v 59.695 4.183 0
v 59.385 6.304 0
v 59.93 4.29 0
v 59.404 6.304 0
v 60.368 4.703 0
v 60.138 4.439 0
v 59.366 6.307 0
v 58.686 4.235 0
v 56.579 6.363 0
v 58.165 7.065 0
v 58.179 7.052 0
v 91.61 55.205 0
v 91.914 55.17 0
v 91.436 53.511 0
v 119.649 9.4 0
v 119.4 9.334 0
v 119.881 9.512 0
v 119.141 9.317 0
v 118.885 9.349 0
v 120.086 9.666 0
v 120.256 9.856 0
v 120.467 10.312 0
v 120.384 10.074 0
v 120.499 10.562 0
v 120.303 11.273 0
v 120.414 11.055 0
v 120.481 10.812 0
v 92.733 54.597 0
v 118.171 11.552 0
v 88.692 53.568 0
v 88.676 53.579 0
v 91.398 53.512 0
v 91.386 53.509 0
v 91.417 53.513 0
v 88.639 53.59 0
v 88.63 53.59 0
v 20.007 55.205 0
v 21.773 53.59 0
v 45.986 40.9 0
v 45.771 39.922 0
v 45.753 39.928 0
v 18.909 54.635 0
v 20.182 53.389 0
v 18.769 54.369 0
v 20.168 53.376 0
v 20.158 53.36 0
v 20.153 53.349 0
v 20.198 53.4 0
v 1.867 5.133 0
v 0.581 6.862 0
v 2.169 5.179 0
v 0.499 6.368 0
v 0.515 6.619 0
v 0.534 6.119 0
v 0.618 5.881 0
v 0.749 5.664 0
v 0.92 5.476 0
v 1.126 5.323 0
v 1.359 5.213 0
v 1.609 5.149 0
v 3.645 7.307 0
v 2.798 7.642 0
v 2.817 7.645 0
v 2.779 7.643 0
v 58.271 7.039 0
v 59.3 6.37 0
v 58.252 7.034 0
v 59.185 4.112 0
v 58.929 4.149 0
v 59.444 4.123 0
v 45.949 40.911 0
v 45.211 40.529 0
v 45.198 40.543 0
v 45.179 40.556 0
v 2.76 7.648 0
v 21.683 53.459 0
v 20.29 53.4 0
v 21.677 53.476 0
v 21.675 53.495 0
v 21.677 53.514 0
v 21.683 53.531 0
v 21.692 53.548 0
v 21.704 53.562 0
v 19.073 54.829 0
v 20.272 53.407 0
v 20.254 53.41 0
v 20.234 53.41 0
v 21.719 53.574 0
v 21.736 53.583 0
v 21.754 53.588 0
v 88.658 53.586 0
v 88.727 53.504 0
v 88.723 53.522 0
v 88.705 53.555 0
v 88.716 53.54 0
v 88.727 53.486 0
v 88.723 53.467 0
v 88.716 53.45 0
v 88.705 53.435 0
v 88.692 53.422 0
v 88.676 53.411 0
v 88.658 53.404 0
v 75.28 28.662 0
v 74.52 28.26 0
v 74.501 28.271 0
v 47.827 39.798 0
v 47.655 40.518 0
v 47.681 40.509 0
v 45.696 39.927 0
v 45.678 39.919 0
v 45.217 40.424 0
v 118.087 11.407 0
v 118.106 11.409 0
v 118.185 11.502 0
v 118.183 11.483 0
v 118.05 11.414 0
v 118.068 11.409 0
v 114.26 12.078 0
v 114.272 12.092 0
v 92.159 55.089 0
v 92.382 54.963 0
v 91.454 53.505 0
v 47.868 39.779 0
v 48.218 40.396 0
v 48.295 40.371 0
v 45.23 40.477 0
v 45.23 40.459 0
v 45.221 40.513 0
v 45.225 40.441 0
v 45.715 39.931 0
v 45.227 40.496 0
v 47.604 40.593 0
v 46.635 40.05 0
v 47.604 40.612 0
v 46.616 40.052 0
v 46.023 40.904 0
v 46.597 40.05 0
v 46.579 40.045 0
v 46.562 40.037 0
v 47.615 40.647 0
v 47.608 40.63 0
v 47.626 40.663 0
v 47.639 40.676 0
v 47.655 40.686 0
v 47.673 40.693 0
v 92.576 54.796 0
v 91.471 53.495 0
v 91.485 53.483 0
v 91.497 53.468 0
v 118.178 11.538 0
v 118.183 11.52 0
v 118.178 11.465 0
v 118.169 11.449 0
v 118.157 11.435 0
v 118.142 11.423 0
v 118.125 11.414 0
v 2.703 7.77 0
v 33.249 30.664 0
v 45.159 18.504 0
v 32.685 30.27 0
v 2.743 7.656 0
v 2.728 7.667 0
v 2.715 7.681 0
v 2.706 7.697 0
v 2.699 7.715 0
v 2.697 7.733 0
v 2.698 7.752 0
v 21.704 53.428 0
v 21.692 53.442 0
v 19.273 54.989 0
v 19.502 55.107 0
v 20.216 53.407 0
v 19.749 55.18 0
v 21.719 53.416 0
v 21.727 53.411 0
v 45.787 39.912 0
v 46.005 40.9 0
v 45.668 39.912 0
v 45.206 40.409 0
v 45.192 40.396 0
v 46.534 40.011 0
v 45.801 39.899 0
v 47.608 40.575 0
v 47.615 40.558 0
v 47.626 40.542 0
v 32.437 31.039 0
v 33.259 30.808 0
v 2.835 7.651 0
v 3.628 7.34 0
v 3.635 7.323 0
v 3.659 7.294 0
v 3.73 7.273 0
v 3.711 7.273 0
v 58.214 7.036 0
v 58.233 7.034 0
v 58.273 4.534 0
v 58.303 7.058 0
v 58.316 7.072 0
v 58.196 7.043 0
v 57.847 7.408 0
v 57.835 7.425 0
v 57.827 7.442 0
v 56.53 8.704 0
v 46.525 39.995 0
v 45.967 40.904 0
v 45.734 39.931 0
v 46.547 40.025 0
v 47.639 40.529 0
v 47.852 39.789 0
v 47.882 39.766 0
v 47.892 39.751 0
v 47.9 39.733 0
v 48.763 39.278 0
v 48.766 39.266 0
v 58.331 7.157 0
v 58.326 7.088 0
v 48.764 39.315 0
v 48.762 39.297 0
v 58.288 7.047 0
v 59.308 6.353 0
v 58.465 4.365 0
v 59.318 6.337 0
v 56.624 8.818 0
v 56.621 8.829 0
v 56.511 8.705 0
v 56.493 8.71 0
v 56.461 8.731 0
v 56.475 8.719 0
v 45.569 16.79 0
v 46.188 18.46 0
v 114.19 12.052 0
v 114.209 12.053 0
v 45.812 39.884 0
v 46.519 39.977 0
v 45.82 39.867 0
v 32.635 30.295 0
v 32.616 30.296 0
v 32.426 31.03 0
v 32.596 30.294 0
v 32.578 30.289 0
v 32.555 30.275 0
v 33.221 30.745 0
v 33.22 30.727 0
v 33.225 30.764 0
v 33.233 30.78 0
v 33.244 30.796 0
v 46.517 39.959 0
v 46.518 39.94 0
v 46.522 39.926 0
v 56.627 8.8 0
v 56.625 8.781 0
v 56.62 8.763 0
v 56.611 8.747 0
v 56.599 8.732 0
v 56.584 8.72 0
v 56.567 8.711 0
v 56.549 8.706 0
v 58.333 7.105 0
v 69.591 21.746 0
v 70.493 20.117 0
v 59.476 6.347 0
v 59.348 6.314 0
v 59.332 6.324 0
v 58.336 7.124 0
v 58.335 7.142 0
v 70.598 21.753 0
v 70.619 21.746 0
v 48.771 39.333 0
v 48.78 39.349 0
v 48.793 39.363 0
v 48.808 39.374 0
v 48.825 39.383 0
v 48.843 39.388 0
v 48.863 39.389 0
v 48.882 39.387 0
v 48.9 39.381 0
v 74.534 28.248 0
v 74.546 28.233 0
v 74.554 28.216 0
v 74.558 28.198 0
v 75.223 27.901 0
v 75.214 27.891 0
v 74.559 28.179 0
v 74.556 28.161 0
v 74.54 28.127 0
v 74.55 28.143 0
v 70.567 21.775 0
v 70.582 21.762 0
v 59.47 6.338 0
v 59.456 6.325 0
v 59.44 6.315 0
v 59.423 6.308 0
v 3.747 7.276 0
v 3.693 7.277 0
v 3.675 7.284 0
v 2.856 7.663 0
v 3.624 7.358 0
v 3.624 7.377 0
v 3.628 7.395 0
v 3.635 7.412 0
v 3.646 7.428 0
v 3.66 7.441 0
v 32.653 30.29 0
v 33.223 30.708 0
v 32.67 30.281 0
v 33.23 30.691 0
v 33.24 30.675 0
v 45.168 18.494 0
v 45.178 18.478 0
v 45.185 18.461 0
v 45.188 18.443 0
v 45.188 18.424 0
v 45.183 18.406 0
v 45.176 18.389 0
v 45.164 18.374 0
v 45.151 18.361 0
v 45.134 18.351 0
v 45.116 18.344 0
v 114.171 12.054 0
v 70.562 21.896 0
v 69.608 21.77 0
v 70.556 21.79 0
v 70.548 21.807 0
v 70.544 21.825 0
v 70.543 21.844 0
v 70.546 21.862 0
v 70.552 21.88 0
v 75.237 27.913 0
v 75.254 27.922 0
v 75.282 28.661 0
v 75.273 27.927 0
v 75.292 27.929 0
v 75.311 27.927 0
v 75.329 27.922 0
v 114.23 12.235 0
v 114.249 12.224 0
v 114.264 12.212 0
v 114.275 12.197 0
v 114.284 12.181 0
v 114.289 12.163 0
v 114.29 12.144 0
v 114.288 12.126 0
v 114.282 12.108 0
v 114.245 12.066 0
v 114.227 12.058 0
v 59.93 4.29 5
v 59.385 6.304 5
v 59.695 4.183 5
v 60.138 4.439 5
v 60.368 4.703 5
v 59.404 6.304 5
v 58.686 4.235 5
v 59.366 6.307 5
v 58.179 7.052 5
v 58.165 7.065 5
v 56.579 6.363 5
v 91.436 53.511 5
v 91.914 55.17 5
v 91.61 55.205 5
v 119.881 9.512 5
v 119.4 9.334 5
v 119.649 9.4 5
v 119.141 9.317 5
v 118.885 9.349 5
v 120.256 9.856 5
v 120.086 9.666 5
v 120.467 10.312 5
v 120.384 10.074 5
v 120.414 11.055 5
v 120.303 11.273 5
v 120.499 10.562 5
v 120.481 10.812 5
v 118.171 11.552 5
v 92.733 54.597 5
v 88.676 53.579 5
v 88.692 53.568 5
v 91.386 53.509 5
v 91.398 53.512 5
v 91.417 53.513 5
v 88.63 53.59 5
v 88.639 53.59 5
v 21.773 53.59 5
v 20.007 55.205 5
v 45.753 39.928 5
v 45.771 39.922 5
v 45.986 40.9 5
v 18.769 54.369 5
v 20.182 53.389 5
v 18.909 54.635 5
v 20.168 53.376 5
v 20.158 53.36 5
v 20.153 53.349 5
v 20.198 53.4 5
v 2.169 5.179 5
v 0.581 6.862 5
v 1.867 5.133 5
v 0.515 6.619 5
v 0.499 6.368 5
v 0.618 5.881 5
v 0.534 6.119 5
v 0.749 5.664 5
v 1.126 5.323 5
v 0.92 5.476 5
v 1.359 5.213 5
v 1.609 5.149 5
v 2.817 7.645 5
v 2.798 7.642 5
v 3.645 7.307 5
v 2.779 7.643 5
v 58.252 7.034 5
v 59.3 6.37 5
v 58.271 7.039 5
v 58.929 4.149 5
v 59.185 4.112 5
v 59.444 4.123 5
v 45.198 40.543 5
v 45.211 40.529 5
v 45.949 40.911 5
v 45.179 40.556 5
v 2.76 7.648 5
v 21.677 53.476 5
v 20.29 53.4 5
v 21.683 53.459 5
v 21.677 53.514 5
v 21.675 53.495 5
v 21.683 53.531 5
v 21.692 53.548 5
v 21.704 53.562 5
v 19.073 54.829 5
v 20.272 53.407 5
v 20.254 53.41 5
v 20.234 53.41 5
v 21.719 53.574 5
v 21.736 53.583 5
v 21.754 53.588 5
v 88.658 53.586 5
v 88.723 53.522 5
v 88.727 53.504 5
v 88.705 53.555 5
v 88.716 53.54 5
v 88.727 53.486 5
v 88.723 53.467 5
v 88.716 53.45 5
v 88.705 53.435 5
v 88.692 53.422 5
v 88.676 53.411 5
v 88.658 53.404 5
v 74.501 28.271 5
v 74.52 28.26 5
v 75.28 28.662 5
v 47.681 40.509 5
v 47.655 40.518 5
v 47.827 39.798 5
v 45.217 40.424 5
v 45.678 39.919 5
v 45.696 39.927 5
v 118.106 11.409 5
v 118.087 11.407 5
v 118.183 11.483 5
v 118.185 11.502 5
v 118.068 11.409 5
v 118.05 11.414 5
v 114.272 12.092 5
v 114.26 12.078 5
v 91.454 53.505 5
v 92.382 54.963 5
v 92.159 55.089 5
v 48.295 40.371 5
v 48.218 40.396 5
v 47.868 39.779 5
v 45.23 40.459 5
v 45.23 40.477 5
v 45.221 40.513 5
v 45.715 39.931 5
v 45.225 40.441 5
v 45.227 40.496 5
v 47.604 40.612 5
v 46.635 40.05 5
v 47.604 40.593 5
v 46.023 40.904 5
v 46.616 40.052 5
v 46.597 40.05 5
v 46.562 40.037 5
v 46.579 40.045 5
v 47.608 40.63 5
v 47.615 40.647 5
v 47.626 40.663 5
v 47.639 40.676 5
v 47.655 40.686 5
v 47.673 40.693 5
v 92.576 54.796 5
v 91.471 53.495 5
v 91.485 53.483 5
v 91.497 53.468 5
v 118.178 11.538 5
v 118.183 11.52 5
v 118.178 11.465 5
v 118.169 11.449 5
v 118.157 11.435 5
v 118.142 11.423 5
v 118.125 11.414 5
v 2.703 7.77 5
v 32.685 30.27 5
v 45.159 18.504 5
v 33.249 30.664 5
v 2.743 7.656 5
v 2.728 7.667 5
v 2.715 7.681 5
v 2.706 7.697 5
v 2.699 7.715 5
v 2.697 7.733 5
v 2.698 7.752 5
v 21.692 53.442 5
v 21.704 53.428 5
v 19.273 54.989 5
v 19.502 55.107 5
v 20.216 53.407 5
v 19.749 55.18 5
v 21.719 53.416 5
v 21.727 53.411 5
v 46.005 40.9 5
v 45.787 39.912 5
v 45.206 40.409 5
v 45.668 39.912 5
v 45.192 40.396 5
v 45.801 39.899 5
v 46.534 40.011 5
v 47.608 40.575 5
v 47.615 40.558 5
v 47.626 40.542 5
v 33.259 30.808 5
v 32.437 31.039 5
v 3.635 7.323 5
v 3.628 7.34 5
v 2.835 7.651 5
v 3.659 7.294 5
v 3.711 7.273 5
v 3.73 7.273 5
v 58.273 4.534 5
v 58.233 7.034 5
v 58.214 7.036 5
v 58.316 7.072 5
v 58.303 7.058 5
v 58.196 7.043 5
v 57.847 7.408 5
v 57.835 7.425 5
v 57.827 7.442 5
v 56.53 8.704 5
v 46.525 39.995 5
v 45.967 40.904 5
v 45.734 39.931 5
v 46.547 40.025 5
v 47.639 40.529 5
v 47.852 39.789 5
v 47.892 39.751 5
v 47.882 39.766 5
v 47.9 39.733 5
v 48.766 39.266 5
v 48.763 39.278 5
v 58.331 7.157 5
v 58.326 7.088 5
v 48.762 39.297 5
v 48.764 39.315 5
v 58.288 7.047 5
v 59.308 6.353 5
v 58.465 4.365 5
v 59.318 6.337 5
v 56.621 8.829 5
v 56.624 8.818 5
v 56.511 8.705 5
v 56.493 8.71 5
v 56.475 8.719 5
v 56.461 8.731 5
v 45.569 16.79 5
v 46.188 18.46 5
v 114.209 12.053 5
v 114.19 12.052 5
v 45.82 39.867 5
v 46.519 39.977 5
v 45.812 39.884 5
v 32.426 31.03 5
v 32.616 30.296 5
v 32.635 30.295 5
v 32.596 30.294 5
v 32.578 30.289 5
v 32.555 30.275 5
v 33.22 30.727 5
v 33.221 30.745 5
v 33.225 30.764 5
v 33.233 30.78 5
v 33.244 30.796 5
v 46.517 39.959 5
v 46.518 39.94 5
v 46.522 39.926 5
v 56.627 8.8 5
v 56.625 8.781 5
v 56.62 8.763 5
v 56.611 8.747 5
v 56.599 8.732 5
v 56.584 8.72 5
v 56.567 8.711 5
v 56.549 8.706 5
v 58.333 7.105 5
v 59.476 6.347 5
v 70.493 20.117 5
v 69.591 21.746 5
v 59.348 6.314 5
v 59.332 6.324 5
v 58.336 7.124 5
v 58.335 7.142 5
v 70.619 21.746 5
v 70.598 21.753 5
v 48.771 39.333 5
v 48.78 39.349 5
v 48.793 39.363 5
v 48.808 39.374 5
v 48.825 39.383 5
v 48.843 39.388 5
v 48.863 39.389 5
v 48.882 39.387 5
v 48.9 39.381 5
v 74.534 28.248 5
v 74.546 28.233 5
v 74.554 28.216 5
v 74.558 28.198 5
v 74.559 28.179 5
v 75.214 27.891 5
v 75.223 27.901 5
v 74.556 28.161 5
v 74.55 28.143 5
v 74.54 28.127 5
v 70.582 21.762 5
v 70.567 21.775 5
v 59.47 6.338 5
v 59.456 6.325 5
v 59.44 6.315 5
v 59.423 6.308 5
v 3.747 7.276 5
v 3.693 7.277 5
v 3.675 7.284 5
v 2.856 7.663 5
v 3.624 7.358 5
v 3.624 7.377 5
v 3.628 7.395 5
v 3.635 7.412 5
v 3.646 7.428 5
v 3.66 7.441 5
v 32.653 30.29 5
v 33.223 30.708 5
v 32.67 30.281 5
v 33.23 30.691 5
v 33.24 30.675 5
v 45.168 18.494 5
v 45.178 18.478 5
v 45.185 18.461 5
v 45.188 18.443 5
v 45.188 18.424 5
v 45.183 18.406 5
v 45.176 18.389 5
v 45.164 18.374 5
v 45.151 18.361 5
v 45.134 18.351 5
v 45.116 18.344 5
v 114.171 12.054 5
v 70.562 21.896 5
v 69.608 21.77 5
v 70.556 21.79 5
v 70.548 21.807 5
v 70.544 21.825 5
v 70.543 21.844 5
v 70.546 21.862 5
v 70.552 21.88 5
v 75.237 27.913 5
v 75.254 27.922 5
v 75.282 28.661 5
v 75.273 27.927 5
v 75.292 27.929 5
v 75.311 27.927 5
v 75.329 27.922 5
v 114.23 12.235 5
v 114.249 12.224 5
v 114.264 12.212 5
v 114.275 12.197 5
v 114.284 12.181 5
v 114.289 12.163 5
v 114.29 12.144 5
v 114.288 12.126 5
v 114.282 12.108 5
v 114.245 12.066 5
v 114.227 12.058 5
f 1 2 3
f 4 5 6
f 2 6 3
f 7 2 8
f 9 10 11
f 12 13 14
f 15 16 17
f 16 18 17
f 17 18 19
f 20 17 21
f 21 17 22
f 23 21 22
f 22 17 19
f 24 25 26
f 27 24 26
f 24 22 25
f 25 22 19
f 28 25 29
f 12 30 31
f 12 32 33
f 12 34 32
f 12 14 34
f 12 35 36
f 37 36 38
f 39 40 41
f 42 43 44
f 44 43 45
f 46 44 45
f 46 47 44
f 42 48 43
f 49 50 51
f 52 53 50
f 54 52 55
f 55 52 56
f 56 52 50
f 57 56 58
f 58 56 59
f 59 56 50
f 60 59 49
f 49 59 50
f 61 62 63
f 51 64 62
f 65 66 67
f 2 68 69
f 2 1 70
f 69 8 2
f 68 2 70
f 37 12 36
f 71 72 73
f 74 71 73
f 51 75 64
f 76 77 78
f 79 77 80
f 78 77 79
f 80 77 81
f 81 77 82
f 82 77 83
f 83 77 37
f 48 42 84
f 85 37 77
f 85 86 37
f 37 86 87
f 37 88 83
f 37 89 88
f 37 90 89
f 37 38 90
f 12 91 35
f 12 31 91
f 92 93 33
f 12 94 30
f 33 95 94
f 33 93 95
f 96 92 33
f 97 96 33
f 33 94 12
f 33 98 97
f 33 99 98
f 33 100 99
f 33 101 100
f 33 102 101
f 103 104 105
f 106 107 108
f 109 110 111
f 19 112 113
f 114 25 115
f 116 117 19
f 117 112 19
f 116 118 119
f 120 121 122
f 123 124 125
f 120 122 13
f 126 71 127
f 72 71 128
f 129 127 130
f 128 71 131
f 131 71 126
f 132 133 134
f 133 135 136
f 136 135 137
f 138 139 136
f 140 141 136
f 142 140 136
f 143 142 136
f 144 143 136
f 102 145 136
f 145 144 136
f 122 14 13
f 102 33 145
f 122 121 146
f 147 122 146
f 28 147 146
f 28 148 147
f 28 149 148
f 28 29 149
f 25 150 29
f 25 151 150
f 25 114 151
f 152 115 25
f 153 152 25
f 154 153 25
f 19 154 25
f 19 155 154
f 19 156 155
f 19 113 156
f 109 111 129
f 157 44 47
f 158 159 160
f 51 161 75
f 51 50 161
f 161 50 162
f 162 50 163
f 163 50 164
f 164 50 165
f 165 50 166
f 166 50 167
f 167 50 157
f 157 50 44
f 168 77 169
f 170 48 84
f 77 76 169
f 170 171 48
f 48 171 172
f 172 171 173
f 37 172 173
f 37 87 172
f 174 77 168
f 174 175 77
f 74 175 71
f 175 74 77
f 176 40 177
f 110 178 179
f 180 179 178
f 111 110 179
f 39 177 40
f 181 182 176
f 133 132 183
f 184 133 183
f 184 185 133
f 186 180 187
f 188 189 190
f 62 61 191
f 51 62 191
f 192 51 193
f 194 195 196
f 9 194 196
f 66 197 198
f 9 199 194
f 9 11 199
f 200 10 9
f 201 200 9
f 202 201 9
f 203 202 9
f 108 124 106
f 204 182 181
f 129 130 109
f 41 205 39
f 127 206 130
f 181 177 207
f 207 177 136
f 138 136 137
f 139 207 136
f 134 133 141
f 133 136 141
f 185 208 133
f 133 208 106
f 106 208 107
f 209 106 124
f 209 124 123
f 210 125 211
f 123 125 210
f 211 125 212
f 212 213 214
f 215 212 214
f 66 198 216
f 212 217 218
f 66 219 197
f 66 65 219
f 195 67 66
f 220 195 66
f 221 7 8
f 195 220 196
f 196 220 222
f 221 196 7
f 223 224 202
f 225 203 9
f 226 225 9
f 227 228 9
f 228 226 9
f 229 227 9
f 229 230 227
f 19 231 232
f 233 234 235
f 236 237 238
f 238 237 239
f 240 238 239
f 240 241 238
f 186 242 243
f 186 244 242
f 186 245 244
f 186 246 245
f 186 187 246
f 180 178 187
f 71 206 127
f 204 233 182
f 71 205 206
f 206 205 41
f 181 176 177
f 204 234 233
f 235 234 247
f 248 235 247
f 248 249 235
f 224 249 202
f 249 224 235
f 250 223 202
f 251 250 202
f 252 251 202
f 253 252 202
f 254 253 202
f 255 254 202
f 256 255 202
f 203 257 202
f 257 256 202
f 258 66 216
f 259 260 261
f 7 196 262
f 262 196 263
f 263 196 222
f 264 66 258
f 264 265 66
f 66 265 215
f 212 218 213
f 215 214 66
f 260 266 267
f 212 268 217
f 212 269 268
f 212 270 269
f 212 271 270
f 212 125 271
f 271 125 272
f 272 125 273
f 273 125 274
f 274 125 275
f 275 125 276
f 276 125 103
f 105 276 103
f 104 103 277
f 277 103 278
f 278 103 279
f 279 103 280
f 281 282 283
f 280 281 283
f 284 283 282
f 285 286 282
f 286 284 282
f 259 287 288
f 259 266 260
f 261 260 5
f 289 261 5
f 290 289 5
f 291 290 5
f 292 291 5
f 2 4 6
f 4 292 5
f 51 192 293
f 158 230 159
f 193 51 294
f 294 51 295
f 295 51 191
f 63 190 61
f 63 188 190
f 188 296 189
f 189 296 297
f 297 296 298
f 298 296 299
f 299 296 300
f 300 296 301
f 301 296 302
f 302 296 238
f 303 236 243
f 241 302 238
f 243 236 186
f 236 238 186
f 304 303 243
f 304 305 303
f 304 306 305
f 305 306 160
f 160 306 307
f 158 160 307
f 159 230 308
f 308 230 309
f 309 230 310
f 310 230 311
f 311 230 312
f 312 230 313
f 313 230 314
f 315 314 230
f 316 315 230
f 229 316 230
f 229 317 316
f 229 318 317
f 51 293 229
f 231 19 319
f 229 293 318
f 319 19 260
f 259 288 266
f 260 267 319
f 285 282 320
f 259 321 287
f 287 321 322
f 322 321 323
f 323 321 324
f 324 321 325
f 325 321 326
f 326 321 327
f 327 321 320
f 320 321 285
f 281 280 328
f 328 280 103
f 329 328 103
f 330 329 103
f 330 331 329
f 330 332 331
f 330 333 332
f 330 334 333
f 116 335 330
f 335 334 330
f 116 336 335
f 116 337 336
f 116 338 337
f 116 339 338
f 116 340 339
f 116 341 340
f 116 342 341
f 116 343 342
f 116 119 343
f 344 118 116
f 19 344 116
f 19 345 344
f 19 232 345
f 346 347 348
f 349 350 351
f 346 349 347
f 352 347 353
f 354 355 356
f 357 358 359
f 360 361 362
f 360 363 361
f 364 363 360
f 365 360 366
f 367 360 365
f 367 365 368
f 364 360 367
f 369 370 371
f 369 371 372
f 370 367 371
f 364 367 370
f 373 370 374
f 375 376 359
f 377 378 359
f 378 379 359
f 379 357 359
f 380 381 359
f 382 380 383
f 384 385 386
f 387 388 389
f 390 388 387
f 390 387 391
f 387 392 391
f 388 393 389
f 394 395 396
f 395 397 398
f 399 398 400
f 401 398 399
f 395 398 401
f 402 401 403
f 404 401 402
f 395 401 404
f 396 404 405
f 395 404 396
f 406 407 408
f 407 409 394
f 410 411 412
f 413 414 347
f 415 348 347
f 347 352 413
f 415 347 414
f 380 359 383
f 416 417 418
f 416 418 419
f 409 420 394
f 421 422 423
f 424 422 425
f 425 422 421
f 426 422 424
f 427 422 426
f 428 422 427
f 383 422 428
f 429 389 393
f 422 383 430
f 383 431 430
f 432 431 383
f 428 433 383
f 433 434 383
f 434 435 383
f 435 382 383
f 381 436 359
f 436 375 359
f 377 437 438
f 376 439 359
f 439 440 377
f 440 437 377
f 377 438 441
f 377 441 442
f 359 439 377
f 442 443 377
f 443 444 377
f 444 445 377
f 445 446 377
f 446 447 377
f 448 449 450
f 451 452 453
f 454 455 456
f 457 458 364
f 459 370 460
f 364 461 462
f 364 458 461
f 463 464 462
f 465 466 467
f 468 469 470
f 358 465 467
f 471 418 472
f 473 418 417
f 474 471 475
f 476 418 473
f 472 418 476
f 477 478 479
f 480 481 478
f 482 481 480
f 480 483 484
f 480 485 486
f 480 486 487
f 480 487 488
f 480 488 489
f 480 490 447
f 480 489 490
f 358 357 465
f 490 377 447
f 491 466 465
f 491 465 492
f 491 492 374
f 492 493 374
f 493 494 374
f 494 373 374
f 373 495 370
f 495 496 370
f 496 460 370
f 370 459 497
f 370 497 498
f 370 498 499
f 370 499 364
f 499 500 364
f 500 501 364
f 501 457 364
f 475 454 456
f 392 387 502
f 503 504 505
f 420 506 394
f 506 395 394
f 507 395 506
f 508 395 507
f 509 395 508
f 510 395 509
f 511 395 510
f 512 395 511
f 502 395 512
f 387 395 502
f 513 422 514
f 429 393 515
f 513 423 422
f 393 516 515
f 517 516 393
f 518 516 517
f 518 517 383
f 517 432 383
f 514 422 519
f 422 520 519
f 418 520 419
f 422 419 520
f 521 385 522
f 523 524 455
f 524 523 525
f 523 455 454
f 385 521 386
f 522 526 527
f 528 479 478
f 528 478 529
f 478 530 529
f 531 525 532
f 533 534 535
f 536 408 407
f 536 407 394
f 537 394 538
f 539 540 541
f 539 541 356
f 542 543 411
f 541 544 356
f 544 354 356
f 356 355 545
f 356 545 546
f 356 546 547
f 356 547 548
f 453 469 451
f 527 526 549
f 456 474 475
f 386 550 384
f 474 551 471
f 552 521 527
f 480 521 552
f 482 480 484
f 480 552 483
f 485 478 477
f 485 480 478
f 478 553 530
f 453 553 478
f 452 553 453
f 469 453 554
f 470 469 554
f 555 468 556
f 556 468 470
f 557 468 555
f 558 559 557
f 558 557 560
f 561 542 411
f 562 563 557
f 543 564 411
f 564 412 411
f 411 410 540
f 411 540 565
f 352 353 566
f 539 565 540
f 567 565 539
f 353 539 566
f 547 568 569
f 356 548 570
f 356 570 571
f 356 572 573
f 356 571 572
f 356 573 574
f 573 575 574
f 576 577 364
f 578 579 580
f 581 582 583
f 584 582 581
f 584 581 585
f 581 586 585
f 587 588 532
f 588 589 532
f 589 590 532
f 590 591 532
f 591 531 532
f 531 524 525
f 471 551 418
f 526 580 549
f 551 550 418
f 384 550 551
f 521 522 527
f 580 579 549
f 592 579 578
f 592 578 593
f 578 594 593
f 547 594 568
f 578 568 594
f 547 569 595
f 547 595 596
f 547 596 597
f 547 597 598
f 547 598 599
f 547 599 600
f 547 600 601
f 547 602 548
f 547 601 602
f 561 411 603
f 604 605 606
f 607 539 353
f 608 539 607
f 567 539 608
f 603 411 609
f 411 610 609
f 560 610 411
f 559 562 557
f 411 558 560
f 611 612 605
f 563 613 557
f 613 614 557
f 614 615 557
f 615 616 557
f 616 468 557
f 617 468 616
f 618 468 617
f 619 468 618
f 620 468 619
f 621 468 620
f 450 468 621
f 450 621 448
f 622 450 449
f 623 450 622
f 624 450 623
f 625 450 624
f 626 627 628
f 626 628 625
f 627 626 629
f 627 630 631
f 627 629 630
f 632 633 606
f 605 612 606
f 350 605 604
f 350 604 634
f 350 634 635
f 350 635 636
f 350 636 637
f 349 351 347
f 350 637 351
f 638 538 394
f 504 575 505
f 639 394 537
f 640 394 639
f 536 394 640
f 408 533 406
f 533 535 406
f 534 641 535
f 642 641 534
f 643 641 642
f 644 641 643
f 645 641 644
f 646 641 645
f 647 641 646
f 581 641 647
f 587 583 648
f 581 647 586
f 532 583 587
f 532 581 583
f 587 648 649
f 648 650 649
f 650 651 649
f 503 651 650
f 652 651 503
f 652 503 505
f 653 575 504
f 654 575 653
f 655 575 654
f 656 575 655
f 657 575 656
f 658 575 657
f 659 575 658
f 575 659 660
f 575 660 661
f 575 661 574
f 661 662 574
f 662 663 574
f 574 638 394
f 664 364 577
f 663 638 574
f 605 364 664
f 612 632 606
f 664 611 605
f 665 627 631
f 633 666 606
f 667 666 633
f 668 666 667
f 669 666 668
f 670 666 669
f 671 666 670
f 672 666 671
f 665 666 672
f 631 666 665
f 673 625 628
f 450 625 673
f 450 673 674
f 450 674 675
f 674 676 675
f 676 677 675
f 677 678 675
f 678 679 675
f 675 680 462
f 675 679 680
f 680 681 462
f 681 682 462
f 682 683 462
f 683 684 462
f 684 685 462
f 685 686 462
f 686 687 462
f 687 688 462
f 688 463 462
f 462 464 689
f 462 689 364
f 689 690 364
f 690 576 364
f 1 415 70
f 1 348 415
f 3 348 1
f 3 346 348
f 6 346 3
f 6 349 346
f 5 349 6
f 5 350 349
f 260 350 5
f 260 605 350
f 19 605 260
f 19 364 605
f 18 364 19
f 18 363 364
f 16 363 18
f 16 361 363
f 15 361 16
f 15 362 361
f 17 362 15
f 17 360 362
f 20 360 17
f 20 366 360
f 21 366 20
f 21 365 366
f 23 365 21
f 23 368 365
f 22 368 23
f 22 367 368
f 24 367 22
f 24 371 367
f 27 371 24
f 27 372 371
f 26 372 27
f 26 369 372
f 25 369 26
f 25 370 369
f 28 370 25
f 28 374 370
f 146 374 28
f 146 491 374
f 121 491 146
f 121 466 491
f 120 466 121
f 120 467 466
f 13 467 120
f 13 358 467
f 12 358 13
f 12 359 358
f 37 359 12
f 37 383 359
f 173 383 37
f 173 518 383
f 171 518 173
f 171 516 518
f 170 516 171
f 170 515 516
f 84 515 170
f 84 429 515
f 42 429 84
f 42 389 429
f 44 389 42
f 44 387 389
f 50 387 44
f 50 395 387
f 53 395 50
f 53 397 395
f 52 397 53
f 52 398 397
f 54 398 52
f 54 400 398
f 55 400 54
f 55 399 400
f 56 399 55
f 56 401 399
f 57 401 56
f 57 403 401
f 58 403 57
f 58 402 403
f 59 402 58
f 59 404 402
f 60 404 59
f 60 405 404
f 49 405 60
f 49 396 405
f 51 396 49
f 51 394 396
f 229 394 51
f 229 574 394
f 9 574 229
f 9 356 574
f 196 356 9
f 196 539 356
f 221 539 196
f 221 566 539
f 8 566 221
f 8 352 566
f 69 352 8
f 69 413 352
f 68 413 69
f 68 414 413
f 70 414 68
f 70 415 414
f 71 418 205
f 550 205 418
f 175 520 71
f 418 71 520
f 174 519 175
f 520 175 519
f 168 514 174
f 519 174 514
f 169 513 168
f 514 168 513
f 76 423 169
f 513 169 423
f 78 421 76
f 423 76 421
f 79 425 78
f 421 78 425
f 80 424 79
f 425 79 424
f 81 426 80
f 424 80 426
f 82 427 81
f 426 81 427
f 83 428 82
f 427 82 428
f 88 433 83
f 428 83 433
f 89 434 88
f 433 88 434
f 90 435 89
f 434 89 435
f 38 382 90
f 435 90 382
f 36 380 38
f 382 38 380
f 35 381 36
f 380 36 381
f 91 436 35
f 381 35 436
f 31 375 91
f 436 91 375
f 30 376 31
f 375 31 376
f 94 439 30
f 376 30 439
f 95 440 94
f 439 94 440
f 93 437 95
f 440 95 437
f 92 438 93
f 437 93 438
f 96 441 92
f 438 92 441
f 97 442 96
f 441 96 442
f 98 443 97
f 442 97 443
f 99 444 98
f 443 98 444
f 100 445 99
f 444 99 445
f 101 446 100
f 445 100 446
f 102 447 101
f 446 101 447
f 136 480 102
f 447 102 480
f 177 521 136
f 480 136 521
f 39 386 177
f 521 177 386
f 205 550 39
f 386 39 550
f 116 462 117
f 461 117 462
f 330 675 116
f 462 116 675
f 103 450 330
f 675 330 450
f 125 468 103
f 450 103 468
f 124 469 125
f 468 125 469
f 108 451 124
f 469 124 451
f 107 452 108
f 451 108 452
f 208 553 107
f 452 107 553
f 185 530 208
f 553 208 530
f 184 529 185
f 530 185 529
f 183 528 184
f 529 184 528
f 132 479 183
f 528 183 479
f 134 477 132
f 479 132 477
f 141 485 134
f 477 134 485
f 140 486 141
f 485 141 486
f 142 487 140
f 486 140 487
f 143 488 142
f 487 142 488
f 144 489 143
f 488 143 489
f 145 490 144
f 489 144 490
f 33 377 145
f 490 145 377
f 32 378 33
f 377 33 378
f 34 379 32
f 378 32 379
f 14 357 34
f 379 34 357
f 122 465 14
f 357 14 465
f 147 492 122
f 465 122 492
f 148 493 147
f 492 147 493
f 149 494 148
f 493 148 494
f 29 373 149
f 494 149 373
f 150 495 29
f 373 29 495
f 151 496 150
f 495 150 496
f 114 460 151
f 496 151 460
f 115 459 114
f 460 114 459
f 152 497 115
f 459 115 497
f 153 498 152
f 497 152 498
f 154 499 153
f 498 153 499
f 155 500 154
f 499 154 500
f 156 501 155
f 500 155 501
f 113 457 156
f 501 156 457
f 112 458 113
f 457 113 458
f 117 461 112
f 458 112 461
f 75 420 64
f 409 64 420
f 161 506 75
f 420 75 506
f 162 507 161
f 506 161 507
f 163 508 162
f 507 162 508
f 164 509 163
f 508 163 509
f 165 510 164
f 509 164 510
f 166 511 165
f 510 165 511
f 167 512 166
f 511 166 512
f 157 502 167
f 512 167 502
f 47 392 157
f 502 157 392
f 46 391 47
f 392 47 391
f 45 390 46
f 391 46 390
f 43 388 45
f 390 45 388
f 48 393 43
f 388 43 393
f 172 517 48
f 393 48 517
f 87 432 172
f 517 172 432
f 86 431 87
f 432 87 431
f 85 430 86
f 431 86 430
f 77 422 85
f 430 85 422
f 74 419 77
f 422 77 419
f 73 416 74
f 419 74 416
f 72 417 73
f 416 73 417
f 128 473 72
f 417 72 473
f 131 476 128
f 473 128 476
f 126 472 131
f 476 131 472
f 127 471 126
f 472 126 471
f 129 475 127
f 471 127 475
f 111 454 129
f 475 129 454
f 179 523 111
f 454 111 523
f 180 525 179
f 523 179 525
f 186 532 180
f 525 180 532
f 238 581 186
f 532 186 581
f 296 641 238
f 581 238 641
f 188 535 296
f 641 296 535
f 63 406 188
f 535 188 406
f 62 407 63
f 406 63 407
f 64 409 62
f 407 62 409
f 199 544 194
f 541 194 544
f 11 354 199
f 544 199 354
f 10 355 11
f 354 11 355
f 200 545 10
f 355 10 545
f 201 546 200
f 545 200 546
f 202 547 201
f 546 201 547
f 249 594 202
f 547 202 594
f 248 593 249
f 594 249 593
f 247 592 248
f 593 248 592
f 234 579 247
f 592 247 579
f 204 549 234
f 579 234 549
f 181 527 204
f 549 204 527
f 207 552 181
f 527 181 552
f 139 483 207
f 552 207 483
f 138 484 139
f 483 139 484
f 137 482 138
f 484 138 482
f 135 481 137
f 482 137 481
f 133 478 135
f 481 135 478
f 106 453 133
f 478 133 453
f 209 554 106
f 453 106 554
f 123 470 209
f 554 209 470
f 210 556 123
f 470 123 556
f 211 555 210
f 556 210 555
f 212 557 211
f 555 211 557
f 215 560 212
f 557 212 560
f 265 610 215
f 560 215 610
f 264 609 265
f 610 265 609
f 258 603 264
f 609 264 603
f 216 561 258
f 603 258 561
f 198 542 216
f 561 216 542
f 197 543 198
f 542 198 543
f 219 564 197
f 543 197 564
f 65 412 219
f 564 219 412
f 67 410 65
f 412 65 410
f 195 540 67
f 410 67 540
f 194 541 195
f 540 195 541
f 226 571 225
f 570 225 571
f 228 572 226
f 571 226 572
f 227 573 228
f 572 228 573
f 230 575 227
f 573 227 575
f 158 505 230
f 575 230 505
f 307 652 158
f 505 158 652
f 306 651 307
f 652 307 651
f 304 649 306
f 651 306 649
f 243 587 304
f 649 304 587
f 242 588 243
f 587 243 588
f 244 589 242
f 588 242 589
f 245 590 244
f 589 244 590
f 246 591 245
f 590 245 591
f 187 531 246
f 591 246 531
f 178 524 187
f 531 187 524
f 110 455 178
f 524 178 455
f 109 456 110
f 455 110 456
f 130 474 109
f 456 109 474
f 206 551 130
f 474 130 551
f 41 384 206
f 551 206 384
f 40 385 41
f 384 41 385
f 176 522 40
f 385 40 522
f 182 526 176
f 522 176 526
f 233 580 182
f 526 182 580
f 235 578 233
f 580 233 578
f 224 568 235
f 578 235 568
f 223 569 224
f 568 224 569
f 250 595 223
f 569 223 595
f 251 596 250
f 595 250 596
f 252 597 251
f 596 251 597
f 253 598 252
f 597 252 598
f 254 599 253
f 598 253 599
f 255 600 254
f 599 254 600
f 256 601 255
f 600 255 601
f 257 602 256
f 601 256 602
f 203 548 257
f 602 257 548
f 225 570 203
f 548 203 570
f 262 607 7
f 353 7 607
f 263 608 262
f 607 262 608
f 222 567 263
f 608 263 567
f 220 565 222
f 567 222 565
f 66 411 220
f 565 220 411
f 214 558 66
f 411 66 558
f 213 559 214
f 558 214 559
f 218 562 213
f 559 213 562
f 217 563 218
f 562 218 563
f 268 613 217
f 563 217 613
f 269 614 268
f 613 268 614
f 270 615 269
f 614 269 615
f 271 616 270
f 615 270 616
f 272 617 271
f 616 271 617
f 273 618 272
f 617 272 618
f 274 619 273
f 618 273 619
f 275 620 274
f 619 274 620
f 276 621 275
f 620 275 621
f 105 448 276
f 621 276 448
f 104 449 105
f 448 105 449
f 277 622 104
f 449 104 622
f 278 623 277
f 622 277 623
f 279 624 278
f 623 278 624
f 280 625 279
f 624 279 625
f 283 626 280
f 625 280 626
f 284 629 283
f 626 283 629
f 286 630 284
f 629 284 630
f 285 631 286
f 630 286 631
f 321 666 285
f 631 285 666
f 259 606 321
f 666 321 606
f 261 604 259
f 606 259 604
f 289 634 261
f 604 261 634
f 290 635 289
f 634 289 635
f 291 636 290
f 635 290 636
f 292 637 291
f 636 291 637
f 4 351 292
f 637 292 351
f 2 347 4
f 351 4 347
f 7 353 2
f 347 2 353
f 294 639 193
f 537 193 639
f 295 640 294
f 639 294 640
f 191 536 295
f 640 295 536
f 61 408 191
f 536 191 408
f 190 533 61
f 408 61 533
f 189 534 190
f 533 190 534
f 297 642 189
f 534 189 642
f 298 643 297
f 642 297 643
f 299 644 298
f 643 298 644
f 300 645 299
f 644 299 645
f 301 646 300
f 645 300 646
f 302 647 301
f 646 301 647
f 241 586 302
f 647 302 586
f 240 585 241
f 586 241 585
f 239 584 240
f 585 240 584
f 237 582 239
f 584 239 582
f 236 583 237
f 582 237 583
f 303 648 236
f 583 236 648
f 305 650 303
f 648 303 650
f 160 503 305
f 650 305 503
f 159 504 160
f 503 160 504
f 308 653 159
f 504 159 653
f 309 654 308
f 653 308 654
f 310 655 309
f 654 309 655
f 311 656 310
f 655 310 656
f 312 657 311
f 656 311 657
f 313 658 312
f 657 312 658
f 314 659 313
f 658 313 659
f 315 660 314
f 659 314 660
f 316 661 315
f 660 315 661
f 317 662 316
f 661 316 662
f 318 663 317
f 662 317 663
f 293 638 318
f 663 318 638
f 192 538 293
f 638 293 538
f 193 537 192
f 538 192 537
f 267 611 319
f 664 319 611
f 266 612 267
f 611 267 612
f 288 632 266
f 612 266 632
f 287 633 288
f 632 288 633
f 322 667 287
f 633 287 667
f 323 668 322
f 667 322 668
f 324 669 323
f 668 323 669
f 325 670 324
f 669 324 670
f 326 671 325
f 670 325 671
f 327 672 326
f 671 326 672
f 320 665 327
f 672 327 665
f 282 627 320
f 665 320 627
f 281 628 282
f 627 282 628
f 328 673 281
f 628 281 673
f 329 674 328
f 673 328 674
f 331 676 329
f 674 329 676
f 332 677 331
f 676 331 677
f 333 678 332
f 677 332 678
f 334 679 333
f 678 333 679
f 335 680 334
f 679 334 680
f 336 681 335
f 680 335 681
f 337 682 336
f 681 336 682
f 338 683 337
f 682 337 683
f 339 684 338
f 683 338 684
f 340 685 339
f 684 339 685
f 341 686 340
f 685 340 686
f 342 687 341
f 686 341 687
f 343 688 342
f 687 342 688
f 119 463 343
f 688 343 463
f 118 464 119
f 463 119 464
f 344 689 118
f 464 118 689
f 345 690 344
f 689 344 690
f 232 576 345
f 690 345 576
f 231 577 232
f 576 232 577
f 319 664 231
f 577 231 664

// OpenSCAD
/*
 * Customizable Origami - Papership - https://www.thingiverse.com/thing:2622520
 * by Dennis Hofmann - https://www.thingiverse.com/mightynozzle/about
 * created 2017-11-03
 * version v1.0
 *
 * Changelog
 * --------------
 * v1.0:
 *      - final design
 * --------------
 * 
 * This work is licensed under the Creative Commons - Attribution - NonCommercial - ShareAlike license.
 * https://creativecommons.org/licenses/by-nc-sa/3.0/
 */


 // Parameter Section //
//-------------------//

// preview[view:north, tilt:top]

// The maximum size of the longest side. The shorter side will be automatically resized in same ratio.
max_size_in_millimeter = 120; //[20:300]

// The height of the model.
model_height_in_millimeter = 5; //[0.2:0.2:100]

// Thickness of the outer outline.
outline_size_in_millimeter = 1.7; //[0.5:0.1:20]

// Thickness of the inner outline.
inline_size_in_millimeter = 0.7; //[0.5:0.1:20]

// Roundiness of the ends of the inner outlines.
inline_edge_radius_in_millimeter = 0.1; //[0.0:0.1:5]

// Flip model
flip_model = "no"; //[yes,no]

/*[hidden]*/
max_size = max_size_in_millimeter;
model_height = model_height_in_millimeter;
$fn=32;

// Outer Points
A1 = [19, 69];
A2 = [480, 196];
A3 = [601, 78];
A4 = [619, 58];
A5 = [730, 232];
A6 = [1245, 114];
A7 = [957, 580];
A8 = [209, 580];

outline = [A1, A2, A3, A4, A5, A6, A7, A8];

// Inner Points
B1 = [480, 436];
B2 = [503, 431];
B3 = [341, 331];
B4 = [785, 305];

// Polygons
C1 = [B3, A2, A3, B1];
C2 = [B1, B2, A4, A3];
C3 = [A4, A5, B4, B2];
C4 = [A5, A6, B4];
C5 = [B2, B4, A6, A7, B1];
C6 = [B1, A7, A8];
C7 = [B1, B3, A1, A8];
C8 = [B3, A2, A1];

cut_polygons = [C1, C2, C3, C4, C5, C6, C7, C8];

min_x = A1[0];
min_y = A4[1];
max_x = A6[0];
max_y = A7[1];

x_size = max_x - min_x;
y_size = max_y - min_y;

x_factor = max_size / x_size;
y_factor = max_size / y_size;

inline_size = x_size > y_size ? inline_size_in_millimeter / x_factor / 2: inline_size_in_millimeter / y_factor / 2;
inline_edge_radius = x_size > y_size ? inline_edge_radius_in_millimeter / x_factor: inline_edge_radius_in_millimeter / y_factor;
outline_size = x_size > y_size ? outline_size_in_millimeter / x_factor - inline_size: outline_size_in_millimeter / y_factor - inline_size;


 // Program Section //
//-----------------//

if(x_size > y_size) {
    resize(newsize=[max_size, x_factor * y_size, model_height]){
        if(flip_model == "yes") {
            mirror([0,1,0]) {
                rotate([180,180,0]) {    
                    create(outline, cut_polygons);
                }
            }
        } else {
            create(outline, cut_polygons);
        }
    }
} else {
    resize(newsize=[y_factor * x_size, max_size, model_height]){
        if(flip_model == "yes") {
            mirror([0,1,0]) {
                rotate([180,180,0]) {    
                    create(outline, cut_polygons);
                }
            }
        } else {
            create(outline, cut_polygons);
        }
    }
}


 // Module Section //
//----------------//

module create() {
    linear_extrude(height=1) {
        difference() {
            offset(r = -0) {
                offset(r = +outline_size) {
                    polygon(points = outline, convexity = 10);
                }
            }
            
            for(cut_polygon = [0:len(cut_polygons)]) {
                offset(r = +inline_edge_radius) {
                    offset(r = -inline_size - inline_edge_radius) {
                        polygon(points = cut_polygons[cut_polygon], convexity = 10);
                    }
                }
            }
        }
    }
}
